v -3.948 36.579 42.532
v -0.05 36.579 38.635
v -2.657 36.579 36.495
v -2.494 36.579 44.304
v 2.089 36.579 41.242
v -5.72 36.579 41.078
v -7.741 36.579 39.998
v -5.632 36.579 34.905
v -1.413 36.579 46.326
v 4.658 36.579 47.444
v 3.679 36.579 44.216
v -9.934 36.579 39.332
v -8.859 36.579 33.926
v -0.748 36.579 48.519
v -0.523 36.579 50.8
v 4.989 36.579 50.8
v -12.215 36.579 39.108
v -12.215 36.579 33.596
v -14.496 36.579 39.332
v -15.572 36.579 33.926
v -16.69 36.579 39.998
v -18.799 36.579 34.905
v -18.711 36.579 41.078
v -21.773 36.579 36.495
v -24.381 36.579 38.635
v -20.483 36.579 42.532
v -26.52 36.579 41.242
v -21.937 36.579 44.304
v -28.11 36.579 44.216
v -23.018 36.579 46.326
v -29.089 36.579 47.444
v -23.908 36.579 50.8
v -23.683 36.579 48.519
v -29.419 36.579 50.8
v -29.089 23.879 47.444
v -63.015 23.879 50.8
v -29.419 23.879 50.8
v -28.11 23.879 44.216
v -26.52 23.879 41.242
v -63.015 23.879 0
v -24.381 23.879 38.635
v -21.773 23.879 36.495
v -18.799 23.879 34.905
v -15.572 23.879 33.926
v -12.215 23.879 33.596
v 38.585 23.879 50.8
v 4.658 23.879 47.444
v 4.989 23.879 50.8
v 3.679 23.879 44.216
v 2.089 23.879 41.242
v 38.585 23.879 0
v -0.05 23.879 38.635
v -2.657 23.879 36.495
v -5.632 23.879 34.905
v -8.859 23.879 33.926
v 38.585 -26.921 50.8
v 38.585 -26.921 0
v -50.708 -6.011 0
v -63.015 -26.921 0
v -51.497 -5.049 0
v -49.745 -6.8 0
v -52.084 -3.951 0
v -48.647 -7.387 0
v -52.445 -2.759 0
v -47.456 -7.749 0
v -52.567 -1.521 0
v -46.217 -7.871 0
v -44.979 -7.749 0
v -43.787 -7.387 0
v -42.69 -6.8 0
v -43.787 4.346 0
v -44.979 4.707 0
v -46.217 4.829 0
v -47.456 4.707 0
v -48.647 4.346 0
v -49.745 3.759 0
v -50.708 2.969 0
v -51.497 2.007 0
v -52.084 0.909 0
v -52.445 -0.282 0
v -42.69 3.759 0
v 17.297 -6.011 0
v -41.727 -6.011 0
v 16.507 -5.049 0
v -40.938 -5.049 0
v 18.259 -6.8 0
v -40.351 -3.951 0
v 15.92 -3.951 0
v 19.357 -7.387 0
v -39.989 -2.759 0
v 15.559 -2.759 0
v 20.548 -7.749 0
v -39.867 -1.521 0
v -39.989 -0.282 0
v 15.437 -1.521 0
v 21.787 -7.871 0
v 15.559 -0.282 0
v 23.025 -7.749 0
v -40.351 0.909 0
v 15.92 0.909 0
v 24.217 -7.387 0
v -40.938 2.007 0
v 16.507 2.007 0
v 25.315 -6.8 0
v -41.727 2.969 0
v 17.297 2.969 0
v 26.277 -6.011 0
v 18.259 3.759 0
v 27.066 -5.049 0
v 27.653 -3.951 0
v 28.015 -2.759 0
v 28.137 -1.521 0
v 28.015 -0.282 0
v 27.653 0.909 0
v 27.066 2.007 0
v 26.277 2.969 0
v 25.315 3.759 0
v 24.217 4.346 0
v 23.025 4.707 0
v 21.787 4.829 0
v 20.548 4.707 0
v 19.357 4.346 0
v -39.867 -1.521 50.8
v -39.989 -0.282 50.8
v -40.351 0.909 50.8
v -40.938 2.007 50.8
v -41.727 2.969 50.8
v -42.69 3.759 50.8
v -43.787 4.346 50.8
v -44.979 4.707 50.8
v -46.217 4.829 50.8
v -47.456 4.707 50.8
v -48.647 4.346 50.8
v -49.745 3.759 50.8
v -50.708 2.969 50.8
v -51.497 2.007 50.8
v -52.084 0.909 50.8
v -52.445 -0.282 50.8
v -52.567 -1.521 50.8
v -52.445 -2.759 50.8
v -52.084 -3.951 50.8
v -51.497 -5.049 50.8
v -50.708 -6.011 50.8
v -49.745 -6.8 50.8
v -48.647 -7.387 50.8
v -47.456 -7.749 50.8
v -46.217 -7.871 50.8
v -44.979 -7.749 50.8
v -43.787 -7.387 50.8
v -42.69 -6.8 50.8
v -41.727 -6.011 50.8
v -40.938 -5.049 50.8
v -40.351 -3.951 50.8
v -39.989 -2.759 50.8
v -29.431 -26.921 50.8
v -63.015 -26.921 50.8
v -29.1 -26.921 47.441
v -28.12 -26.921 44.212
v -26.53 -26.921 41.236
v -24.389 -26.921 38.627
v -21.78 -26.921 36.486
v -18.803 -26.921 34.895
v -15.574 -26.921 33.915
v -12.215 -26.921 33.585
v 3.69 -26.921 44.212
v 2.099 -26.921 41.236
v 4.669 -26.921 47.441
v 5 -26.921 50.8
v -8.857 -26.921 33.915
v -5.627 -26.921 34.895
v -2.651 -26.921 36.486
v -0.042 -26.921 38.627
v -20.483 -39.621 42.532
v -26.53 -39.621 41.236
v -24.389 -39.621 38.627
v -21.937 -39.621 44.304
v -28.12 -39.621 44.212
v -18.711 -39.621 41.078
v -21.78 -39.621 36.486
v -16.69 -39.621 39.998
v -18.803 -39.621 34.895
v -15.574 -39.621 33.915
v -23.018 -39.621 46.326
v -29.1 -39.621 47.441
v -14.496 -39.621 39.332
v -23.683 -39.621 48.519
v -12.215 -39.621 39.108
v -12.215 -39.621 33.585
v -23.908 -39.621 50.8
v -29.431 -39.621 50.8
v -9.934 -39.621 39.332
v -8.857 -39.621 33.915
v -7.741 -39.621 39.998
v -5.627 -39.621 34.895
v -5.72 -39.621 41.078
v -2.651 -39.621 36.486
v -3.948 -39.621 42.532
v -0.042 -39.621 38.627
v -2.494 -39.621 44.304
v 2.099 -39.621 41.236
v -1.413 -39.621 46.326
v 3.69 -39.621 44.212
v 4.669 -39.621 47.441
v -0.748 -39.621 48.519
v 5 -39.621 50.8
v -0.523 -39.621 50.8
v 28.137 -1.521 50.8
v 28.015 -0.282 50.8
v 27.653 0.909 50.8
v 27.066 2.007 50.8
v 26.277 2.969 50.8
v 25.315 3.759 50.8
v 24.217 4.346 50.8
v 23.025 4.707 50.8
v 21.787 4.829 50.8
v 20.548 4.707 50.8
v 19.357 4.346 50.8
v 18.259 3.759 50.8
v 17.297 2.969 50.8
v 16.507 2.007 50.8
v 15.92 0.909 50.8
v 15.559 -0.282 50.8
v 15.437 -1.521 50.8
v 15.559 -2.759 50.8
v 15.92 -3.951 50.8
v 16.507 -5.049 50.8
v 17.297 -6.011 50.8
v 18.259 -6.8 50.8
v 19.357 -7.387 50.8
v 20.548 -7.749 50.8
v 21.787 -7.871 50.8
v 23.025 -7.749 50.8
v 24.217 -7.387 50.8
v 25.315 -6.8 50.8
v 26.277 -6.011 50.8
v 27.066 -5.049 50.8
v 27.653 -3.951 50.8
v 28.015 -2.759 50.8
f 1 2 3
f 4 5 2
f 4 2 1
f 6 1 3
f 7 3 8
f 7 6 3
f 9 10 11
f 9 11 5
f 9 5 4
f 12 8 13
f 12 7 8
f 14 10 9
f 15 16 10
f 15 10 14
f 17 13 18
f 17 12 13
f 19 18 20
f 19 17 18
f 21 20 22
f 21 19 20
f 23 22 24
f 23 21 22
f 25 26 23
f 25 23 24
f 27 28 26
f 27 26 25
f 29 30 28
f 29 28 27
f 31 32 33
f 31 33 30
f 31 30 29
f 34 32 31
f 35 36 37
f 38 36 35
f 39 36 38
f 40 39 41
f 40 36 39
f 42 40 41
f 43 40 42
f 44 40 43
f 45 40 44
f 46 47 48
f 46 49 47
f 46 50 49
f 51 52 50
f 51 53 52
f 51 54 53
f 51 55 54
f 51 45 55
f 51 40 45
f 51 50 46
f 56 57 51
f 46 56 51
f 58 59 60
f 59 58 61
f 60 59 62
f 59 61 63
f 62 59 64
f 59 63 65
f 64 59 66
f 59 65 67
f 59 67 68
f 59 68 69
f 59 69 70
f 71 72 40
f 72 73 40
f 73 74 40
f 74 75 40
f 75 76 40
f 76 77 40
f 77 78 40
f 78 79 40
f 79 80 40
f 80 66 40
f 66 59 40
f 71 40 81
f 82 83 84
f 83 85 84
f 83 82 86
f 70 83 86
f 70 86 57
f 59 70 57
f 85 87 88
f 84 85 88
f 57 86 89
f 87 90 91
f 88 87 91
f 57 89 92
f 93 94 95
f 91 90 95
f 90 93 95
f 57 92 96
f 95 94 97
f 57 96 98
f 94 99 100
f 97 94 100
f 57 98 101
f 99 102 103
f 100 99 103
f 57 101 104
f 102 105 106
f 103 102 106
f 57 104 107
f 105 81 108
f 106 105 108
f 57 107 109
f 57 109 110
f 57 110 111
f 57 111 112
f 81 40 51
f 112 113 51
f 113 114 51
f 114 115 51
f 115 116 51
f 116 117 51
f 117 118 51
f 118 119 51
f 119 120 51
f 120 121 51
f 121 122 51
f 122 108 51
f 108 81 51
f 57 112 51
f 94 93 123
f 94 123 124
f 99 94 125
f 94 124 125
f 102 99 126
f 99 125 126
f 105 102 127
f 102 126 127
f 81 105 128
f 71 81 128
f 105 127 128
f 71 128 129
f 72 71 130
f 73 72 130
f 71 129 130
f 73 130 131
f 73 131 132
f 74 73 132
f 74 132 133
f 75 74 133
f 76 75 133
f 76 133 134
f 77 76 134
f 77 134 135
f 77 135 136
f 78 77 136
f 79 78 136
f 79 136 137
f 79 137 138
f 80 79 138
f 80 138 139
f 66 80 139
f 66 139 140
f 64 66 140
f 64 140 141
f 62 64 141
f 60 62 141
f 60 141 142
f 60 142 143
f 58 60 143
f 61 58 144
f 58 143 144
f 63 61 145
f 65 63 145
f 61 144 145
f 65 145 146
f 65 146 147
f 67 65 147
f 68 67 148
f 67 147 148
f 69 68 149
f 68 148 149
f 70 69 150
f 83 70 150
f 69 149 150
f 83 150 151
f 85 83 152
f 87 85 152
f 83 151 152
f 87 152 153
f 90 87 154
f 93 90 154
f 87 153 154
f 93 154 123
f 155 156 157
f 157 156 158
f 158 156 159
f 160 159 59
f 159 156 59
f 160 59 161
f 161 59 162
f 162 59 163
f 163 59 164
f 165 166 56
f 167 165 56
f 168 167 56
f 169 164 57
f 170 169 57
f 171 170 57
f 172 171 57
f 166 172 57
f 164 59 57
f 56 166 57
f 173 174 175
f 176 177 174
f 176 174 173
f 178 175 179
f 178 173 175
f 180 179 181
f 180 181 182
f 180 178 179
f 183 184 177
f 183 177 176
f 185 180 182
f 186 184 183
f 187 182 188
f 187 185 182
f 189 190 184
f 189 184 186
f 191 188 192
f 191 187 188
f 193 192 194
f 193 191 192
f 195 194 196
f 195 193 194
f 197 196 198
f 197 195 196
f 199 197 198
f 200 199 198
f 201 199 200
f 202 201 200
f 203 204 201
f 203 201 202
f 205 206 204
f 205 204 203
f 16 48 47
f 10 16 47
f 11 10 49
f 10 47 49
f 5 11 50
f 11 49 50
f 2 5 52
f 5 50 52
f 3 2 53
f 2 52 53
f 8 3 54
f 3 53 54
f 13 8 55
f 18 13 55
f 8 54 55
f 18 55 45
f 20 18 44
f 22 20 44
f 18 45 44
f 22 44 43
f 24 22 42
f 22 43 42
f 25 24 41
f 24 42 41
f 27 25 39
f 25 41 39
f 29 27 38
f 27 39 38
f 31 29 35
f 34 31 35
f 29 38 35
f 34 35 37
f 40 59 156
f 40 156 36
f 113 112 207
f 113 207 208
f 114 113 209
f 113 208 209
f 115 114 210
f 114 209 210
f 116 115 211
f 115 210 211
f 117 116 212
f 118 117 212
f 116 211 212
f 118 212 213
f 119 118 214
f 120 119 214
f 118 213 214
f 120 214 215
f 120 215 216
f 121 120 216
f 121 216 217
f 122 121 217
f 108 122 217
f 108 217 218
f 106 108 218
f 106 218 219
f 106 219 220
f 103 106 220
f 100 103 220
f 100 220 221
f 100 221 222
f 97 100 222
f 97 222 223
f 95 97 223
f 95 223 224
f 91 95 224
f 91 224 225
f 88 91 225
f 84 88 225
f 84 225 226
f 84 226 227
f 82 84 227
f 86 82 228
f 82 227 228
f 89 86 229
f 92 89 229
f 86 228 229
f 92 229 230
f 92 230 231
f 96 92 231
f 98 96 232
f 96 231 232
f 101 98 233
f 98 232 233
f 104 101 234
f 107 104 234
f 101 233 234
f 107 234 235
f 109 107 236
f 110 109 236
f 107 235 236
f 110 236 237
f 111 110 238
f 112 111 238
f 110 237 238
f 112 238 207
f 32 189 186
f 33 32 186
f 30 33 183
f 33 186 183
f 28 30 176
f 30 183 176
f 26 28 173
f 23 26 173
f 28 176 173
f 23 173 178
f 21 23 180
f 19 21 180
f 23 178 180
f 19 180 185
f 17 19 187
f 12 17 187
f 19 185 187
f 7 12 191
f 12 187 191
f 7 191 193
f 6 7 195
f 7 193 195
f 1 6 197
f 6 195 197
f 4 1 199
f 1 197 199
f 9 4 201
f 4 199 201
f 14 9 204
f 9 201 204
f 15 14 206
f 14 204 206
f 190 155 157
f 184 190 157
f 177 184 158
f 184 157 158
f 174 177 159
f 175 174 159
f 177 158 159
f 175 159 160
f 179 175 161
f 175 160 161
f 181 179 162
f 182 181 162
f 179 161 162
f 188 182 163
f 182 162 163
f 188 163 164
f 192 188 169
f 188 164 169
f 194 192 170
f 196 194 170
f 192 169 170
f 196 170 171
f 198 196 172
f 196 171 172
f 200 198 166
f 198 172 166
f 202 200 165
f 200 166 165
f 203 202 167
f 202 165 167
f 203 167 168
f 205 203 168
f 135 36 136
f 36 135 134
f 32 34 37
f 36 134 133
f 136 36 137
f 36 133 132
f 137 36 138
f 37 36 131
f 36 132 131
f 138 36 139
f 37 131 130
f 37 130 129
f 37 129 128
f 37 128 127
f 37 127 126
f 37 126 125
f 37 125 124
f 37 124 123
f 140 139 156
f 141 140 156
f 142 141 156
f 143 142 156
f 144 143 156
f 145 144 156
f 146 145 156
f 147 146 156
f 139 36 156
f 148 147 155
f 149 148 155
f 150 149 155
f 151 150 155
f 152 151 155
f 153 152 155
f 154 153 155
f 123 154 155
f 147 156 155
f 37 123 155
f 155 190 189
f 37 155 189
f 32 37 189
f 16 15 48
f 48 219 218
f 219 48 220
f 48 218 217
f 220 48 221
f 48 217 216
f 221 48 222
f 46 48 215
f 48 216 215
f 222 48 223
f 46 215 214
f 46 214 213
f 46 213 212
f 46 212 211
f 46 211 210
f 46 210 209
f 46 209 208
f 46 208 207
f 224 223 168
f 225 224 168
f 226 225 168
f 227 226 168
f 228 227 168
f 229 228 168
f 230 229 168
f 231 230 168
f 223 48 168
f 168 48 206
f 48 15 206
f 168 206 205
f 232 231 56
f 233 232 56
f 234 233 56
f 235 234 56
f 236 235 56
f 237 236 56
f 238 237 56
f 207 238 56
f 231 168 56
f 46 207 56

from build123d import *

# Parameters (mm, degrees)
F0_W      = 101.6
F0_H      = 50.8
F1_DEPTH  = 50.8
F3_DEPTH  = 59.69
F4_DEPTH  = 12.7
F6_DEPTH  = 12.7
F7_R      = 6.35
F8_DEPTH  = 67.818
F9_R      = 6.35
F10_DEPTH = 76.2


with BuildPart() as f1:
    # F0 (on Top) → F1 (new body)
    with BuildSketch(Plane.XY):
        with Locations((-12.215394, -1.520658)):
            Rectangle(F0_W, F0_H)
    extrude(amount=F1_DEPTH)

    # F2 (on face) → F3 (cut)
    with BuildSketch(Plane.XZ.offset(26.920658)):
        with BuildLine():
            Line((-0.523097, 50.8), (-23.907691, 50.8))
            ThreePointArc((-23.907691, 50.8), (-12.215394, 39.107703), (-0.523097, 50.8))
        make_face()
    extrude(amount=-F3_DEPTH, mode=Mode.SUBTRACT)

    # F2 (on face) → F4 (join)
    with BuildSketch(Plane.XZ.offset(26.920658)):
        with BuildLine():
            Line((-23.907691, 50.8), (-29.430878, 50.8))
            ThreePointArc((-29.430878, 50.8), (-12.215394, 33.584516), (5.00009, 50.8))
            Line((5.00009, 50.8), (-0.523097, 50.8))
            ThreePointArc((-0.523097, 50.8), (-12.215394, 39.107703), (-23.907691, 50.8))
        make_face()
    extrude(amount=F4_DEPTH)

    # F5 (on face) → F6 (join)
    with BuildSketch(Plane(origin=(0, 23.879342, 0), x_dir=(-1, 0, 0), z_dir=(0, 1, 0))):
        with BuildLine():
            Line((0.523097, 50.8), (-4.988703, 50.8))
            ThreePointArc((-4.988703, 50.8), (12.215394, 33.595903), (29.419491, 50.8))
            Line((29.419491, 50.8), (23.907691, 50.8))
            ThreePointArc((23.907691, 50.8), (12.215394, 39.107703), (0.523097, 50.8))
        make_face()
    extrude(amount=F6_DEPTH)

    # F7 (on face) → F8 (cut)
    with BuildSketch(Plane.XY.offset(50.8)):
        with Locations((-46.217443, -1.520658)):
            Circle(F7_R)
    extrude(amount=-F8_DEPTH, mode=Mode.SUBTRACT)

    # F9 (on face) → F10 (cut)
    with BuildSketch(Plane.XY.offset(50.8)):
        with Locations((21.786655, -1.520658)):
            Circle(F9_R)
    extrude(amount=-F10_DEPTH, mode=Mode.SUBTRACT)


solid = f1.part
